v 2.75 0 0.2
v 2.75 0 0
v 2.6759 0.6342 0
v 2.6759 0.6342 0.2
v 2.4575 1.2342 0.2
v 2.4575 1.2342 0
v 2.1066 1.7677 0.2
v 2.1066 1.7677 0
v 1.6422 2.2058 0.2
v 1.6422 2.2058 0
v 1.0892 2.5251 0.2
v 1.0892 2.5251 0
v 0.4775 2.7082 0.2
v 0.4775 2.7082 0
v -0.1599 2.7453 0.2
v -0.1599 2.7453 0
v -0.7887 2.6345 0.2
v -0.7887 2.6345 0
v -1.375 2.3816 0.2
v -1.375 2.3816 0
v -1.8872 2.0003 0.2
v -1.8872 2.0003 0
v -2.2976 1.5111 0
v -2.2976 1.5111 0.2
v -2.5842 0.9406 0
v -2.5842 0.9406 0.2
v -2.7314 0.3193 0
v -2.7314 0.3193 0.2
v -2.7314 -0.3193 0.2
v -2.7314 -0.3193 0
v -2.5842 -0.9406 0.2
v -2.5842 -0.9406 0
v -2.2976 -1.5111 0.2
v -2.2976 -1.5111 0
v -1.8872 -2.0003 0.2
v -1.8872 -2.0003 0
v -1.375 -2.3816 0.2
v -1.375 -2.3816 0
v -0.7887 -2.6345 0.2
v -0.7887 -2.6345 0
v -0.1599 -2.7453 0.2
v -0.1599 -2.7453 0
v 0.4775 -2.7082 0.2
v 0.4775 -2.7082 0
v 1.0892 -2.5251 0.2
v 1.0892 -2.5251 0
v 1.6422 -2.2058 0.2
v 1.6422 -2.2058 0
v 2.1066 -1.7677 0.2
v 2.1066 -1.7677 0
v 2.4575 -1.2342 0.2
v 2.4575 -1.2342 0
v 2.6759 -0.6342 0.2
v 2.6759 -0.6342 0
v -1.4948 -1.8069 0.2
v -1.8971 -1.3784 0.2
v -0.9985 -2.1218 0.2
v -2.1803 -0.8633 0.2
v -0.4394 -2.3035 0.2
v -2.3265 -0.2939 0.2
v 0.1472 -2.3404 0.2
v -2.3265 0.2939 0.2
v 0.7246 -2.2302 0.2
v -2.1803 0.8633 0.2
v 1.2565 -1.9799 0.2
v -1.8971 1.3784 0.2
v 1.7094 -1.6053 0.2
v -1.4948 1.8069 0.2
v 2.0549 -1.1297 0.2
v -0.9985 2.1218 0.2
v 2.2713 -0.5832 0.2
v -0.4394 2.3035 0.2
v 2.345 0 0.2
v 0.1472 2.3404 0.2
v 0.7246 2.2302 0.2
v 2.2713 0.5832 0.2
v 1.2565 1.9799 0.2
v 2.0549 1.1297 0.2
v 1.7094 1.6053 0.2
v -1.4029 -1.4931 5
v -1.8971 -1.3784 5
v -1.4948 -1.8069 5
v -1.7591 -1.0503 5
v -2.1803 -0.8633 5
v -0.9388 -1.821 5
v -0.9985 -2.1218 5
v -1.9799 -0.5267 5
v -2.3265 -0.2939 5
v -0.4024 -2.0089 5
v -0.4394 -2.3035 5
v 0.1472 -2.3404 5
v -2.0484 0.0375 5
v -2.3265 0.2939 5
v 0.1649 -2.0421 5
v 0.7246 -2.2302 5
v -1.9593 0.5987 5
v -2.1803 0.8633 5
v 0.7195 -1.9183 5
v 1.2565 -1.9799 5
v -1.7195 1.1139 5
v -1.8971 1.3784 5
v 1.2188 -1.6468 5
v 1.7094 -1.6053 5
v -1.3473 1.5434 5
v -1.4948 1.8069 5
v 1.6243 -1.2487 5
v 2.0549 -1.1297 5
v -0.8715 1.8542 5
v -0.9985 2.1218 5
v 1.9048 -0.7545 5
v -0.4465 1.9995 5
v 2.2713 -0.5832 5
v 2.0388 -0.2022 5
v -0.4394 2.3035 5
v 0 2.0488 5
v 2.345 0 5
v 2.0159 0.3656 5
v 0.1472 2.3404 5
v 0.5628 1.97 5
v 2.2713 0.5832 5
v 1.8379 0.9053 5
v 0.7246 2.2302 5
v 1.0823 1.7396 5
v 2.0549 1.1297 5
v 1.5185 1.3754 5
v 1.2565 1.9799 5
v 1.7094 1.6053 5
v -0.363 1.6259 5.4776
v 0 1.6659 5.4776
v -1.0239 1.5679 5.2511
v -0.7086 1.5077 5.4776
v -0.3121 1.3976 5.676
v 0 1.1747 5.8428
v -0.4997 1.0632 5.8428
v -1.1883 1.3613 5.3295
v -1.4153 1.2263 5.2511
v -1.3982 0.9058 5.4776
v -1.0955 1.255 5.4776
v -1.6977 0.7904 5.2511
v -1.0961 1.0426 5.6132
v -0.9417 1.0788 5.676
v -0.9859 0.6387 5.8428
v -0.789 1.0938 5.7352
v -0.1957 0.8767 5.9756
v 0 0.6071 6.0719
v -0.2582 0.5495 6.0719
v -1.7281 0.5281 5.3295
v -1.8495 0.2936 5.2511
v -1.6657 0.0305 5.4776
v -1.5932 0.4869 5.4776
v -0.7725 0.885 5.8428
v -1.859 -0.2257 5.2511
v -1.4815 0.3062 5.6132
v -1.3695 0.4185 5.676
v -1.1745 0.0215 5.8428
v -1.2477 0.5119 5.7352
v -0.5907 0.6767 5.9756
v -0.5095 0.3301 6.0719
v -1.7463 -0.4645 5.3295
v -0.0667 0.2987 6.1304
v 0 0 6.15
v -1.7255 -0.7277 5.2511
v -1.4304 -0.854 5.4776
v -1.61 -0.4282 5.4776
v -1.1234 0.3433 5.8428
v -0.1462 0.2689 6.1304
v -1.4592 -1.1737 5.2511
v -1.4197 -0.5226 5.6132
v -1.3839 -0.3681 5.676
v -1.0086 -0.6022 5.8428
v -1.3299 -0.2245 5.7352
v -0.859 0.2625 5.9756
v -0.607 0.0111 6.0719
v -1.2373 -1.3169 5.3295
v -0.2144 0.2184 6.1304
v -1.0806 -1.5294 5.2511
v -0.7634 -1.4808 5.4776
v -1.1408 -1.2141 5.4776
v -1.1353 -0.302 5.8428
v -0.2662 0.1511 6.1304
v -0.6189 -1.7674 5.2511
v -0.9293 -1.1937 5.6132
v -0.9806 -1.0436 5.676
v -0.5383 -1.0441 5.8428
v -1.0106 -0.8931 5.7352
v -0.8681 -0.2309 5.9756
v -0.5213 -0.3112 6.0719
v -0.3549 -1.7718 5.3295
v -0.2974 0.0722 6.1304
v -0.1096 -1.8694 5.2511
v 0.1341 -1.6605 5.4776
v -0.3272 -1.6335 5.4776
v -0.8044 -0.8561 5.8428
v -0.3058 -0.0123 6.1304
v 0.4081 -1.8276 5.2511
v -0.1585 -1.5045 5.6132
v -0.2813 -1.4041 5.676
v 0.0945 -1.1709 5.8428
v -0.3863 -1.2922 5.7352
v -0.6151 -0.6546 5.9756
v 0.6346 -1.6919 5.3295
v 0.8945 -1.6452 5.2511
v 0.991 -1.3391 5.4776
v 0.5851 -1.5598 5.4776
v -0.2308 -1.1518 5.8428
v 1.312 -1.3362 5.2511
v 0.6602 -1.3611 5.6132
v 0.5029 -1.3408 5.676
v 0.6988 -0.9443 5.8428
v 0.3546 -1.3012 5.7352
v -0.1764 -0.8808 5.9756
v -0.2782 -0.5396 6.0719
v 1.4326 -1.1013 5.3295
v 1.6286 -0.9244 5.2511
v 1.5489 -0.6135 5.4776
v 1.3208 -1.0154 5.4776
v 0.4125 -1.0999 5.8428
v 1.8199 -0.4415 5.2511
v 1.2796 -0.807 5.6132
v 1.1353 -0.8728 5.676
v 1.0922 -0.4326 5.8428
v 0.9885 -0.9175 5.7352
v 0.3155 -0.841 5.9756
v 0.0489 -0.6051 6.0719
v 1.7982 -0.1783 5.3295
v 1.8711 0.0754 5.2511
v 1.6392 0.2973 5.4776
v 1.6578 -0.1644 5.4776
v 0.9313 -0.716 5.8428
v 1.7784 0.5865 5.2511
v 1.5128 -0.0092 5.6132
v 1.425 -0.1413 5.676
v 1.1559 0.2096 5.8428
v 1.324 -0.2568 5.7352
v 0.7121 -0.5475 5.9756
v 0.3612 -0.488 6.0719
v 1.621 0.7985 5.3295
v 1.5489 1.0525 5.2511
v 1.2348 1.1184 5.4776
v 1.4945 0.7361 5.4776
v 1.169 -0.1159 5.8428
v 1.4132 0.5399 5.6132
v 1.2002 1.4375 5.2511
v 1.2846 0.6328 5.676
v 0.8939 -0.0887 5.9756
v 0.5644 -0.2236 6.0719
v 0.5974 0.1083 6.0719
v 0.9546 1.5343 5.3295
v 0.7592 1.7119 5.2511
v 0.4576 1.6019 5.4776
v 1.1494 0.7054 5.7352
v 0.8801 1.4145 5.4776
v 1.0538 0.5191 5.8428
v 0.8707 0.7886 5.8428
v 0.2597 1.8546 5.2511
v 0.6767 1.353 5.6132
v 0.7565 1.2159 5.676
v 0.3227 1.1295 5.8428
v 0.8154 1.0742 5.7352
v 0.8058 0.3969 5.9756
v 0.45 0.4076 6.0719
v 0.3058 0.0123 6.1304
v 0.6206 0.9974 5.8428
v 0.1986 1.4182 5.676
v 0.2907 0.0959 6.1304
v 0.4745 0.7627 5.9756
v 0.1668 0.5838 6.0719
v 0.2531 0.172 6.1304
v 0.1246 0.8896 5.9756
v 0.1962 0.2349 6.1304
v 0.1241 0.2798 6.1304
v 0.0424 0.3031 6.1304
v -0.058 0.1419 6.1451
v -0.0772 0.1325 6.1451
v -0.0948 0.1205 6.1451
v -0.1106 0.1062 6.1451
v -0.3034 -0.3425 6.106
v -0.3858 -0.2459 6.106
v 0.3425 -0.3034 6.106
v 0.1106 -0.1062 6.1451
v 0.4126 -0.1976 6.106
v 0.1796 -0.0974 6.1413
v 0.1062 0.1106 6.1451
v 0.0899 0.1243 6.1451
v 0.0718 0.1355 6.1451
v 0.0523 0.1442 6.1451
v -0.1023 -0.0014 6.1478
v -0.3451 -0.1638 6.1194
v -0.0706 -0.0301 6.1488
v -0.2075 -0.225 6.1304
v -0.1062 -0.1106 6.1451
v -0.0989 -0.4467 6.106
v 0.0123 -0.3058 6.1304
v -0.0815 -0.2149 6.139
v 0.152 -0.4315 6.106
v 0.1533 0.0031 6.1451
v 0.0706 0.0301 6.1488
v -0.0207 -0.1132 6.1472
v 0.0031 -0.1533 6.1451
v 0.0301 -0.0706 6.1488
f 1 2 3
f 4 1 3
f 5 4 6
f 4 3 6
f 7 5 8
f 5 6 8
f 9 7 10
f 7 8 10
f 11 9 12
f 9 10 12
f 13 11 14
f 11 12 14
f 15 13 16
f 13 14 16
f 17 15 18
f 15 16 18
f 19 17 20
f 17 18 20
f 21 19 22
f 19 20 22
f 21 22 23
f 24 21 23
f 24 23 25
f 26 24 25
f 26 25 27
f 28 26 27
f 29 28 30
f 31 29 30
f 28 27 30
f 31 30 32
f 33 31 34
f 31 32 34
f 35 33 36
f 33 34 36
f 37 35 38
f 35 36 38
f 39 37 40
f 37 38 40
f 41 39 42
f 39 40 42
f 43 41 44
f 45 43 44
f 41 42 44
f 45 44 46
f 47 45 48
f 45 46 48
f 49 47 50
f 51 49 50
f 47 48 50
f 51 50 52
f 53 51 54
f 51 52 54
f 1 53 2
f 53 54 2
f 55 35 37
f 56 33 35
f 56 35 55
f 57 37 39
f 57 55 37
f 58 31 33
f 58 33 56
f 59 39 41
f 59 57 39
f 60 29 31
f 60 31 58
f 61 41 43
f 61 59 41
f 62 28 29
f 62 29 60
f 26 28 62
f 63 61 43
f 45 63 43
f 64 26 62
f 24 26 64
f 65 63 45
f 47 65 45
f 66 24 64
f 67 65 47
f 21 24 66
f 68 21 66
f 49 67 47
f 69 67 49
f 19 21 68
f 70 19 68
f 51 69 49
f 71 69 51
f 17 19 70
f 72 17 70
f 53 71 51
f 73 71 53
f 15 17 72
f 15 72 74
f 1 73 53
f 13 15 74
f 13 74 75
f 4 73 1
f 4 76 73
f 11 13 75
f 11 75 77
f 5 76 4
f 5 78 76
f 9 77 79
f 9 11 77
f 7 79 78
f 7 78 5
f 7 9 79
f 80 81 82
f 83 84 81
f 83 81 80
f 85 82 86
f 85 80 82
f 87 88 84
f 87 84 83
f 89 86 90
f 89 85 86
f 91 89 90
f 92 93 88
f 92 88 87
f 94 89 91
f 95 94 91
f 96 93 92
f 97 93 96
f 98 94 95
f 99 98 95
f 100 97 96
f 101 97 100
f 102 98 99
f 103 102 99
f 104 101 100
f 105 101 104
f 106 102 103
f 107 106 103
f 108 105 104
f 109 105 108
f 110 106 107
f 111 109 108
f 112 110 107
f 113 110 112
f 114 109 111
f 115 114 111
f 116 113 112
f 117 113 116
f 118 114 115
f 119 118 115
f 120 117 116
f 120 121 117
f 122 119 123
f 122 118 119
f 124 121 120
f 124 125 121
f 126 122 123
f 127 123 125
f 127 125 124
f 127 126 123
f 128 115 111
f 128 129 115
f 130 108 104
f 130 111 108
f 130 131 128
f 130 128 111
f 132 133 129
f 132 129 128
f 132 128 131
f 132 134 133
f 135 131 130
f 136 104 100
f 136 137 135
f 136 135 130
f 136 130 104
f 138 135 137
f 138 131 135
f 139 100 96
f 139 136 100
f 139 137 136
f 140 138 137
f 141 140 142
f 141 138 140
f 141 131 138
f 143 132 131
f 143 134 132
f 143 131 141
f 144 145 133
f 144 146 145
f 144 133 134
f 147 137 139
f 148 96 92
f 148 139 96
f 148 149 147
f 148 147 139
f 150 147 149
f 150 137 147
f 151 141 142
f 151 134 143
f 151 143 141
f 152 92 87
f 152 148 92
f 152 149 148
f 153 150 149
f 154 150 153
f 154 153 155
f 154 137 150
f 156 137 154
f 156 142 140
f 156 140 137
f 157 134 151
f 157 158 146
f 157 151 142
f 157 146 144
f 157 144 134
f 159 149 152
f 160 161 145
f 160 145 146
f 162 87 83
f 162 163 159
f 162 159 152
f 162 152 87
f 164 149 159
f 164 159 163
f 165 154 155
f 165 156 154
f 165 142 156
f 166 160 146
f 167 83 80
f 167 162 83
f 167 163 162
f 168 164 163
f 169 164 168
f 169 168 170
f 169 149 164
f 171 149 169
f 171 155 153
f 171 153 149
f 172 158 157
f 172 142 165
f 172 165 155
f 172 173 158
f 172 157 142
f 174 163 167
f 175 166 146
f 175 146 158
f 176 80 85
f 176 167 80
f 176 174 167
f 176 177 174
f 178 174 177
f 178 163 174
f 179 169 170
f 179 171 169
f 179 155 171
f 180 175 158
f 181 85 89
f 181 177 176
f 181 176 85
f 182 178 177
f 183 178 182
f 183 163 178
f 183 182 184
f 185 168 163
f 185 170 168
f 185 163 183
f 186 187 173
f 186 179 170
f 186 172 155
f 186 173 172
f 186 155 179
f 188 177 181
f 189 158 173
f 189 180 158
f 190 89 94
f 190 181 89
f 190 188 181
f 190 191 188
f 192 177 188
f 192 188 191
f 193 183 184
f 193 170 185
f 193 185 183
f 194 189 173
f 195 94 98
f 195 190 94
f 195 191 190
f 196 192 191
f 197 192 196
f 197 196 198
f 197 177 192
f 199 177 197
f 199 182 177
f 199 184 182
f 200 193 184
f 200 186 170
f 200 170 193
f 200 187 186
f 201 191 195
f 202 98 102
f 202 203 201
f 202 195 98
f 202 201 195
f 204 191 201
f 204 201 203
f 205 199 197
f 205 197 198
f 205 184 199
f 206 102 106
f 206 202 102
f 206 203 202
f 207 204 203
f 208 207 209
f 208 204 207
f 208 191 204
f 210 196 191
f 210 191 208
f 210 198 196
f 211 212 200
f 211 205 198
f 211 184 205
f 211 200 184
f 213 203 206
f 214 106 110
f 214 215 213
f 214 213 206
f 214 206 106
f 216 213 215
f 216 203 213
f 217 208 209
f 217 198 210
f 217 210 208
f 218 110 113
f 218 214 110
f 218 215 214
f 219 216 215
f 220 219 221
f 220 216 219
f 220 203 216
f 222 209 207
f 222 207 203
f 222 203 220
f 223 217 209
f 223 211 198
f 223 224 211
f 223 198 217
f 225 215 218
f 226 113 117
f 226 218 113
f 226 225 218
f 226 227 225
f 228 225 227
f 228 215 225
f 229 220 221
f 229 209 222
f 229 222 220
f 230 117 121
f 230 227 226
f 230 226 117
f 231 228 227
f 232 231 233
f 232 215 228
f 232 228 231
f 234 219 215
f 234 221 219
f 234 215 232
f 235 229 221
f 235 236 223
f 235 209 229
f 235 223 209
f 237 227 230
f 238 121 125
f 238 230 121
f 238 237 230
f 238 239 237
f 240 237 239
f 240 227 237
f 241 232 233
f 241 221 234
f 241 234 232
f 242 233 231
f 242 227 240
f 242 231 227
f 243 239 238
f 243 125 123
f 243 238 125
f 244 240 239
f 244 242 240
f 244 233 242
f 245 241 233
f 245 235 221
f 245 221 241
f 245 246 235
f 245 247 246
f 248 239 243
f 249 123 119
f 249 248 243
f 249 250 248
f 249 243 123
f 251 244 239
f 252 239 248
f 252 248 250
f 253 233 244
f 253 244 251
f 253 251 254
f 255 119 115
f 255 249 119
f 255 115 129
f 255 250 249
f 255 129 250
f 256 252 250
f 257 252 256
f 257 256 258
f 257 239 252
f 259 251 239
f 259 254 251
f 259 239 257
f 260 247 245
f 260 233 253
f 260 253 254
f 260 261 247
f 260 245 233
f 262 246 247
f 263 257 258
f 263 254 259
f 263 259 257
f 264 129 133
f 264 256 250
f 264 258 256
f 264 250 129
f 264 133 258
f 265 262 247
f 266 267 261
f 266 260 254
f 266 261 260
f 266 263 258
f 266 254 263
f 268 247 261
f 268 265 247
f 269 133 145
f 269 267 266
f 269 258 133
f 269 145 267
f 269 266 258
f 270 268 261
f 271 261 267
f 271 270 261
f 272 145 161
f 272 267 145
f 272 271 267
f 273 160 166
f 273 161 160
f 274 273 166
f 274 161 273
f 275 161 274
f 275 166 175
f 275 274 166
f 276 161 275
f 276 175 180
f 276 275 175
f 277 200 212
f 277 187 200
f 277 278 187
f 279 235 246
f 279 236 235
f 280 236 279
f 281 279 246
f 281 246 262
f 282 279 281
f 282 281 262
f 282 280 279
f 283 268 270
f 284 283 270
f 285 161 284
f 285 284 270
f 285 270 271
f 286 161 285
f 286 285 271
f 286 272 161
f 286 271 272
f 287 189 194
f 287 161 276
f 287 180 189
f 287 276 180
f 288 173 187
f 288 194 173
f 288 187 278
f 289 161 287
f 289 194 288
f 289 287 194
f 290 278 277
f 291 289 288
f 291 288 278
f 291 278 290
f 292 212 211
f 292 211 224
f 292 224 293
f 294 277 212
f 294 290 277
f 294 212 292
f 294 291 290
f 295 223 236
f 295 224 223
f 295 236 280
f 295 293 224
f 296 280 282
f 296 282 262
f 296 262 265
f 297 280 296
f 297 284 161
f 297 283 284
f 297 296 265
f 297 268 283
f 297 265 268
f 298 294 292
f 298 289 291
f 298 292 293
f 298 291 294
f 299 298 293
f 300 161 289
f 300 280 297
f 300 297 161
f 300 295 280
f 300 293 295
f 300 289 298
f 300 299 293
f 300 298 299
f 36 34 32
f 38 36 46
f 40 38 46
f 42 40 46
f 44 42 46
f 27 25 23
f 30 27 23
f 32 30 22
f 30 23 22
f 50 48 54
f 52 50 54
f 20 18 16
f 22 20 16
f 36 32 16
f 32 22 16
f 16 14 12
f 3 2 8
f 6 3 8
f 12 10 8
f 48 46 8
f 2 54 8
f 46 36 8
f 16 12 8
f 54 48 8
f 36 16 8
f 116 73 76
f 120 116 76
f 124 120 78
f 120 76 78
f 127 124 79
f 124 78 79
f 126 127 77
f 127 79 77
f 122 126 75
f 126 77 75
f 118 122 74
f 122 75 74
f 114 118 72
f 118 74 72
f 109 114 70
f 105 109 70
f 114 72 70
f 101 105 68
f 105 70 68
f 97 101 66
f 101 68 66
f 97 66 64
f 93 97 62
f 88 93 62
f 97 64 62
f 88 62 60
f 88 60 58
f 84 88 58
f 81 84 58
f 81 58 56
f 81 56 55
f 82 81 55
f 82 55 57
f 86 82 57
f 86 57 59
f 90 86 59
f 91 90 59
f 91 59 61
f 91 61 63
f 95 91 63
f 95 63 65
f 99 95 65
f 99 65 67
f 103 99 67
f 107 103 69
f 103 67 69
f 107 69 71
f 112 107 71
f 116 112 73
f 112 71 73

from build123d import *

# Parameters (mm, degrees)
SKETCH_R     = 2.75
PAD_DEPTH    = 0.2
SKETCH002_R  = 2.345
PAD001_DEPTH = 5


with BuildPart() as part:
    # Sketch → Pad (new body)
    with BuildSketch(Plane.XY):
        Circle(SKETCH_R)
    extrude(amount=PAD_DEPTH)

    # Sketch002 → Pad001 (join)
    with BuildSketch(Plane.XY):
        Circle(SKETCH002_R)
    extrude(amount=PAD001_DEPTH)

    # Sketch003 → Revolution (revolve)
    with BuildSketch(Plane.YZ):
        with BuildLine():
            Line((0, 4.85), (0, 6.15))
            ThreePointArc((2.133073, 4.85), (1.249, 5.79939), (0, 6.15))
            Line((0, 4.85), (2.133073, 4.85))
        make_face()
    revolve(axis=Axis((0, 0, 0), (0, 0, 1)))


solid = part.part
